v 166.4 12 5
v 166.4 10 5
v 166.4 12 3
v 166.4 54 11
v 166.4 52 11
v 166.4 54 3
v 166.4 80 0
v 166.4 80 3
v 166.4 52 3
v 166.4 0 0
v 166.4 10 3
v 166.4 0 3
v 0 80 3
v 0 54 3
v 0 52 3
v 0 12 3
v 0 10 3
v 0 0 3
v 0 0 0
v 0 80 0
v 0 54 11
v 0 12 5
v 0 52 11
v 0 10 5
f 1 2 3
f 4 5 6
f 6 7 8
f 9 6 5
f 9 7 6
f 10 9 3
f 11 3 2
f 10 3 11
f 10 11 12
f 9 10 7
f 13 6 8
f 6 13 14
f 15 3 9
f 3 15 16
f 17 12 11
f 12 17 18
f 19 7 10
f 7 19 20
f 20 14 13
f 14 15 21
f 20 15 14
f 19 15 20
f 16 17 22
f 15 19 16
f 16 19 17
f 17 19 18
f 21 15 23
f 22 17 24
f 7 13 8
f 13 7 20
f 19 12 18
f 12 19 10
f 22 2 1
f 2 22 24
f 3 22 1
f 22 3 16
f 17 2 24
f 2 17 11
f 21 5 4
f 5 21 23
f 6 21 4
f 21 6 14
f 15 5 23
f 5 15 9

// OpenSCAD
// Einfacher Screen
// Maße: 163mm x 10mm x 1mm

// Parameter
wanddicke = 2;     // Wanddicke in mm aus aufsatz.scad
breite = 162.4 + (2*wanddicke);    // Breite in mm
hoehe = 80;     // Höhe in mm (1cm)
dicke = 3;       // Dicke in mm

// Erhöhungs-Parameter
erhohung_breite = 2;            // Breite der Erhöhungen in mm
erste_erhohung_hohe = 2;        // Höhe der ersten Erhöhung in mm
zweite_erhohung_hohe = 8;       // Höhe der zweiten Erhöhung in mm (auf 5mm angepasst)
hohlraum = 40;                  // Abstand zwischen den Erhöhungen in mm

// Position der ersten (unteren) Erhöhung
erste_erhohung_pos = 10;        // 10mm vom oberen Rand

// Position der zweiten (oberen) Erhöhung basierend auf der ersten Position und dem Hohlraum
zweite_erhohung_pos = erste_erhohung_pos + erhohung_breite + hohlraum;

// Erstellung des Screens als einfacher Quader
cube([breite, hoehe, dicke]);

// Erste Erhöhung: 2mm × 2mm über die gesamte Länge, bei 10mm von oben
translate([0, erste_erhohung_pos, dicke]) {
    cube([breite, erhohung_breite, erste_erhohung_hohe]);
}

// Zweite Erhöhung: 2mm × 5mm über die gesamte Länge, 
// Position basierend auf erste_erhohung_pos + erhohung_breite + hohlraum
translate([0, zweite_erhohung_pos, dicke]) {
    cube([breite, erhohung_breite, zweite_erhohung_hohe]);
}
